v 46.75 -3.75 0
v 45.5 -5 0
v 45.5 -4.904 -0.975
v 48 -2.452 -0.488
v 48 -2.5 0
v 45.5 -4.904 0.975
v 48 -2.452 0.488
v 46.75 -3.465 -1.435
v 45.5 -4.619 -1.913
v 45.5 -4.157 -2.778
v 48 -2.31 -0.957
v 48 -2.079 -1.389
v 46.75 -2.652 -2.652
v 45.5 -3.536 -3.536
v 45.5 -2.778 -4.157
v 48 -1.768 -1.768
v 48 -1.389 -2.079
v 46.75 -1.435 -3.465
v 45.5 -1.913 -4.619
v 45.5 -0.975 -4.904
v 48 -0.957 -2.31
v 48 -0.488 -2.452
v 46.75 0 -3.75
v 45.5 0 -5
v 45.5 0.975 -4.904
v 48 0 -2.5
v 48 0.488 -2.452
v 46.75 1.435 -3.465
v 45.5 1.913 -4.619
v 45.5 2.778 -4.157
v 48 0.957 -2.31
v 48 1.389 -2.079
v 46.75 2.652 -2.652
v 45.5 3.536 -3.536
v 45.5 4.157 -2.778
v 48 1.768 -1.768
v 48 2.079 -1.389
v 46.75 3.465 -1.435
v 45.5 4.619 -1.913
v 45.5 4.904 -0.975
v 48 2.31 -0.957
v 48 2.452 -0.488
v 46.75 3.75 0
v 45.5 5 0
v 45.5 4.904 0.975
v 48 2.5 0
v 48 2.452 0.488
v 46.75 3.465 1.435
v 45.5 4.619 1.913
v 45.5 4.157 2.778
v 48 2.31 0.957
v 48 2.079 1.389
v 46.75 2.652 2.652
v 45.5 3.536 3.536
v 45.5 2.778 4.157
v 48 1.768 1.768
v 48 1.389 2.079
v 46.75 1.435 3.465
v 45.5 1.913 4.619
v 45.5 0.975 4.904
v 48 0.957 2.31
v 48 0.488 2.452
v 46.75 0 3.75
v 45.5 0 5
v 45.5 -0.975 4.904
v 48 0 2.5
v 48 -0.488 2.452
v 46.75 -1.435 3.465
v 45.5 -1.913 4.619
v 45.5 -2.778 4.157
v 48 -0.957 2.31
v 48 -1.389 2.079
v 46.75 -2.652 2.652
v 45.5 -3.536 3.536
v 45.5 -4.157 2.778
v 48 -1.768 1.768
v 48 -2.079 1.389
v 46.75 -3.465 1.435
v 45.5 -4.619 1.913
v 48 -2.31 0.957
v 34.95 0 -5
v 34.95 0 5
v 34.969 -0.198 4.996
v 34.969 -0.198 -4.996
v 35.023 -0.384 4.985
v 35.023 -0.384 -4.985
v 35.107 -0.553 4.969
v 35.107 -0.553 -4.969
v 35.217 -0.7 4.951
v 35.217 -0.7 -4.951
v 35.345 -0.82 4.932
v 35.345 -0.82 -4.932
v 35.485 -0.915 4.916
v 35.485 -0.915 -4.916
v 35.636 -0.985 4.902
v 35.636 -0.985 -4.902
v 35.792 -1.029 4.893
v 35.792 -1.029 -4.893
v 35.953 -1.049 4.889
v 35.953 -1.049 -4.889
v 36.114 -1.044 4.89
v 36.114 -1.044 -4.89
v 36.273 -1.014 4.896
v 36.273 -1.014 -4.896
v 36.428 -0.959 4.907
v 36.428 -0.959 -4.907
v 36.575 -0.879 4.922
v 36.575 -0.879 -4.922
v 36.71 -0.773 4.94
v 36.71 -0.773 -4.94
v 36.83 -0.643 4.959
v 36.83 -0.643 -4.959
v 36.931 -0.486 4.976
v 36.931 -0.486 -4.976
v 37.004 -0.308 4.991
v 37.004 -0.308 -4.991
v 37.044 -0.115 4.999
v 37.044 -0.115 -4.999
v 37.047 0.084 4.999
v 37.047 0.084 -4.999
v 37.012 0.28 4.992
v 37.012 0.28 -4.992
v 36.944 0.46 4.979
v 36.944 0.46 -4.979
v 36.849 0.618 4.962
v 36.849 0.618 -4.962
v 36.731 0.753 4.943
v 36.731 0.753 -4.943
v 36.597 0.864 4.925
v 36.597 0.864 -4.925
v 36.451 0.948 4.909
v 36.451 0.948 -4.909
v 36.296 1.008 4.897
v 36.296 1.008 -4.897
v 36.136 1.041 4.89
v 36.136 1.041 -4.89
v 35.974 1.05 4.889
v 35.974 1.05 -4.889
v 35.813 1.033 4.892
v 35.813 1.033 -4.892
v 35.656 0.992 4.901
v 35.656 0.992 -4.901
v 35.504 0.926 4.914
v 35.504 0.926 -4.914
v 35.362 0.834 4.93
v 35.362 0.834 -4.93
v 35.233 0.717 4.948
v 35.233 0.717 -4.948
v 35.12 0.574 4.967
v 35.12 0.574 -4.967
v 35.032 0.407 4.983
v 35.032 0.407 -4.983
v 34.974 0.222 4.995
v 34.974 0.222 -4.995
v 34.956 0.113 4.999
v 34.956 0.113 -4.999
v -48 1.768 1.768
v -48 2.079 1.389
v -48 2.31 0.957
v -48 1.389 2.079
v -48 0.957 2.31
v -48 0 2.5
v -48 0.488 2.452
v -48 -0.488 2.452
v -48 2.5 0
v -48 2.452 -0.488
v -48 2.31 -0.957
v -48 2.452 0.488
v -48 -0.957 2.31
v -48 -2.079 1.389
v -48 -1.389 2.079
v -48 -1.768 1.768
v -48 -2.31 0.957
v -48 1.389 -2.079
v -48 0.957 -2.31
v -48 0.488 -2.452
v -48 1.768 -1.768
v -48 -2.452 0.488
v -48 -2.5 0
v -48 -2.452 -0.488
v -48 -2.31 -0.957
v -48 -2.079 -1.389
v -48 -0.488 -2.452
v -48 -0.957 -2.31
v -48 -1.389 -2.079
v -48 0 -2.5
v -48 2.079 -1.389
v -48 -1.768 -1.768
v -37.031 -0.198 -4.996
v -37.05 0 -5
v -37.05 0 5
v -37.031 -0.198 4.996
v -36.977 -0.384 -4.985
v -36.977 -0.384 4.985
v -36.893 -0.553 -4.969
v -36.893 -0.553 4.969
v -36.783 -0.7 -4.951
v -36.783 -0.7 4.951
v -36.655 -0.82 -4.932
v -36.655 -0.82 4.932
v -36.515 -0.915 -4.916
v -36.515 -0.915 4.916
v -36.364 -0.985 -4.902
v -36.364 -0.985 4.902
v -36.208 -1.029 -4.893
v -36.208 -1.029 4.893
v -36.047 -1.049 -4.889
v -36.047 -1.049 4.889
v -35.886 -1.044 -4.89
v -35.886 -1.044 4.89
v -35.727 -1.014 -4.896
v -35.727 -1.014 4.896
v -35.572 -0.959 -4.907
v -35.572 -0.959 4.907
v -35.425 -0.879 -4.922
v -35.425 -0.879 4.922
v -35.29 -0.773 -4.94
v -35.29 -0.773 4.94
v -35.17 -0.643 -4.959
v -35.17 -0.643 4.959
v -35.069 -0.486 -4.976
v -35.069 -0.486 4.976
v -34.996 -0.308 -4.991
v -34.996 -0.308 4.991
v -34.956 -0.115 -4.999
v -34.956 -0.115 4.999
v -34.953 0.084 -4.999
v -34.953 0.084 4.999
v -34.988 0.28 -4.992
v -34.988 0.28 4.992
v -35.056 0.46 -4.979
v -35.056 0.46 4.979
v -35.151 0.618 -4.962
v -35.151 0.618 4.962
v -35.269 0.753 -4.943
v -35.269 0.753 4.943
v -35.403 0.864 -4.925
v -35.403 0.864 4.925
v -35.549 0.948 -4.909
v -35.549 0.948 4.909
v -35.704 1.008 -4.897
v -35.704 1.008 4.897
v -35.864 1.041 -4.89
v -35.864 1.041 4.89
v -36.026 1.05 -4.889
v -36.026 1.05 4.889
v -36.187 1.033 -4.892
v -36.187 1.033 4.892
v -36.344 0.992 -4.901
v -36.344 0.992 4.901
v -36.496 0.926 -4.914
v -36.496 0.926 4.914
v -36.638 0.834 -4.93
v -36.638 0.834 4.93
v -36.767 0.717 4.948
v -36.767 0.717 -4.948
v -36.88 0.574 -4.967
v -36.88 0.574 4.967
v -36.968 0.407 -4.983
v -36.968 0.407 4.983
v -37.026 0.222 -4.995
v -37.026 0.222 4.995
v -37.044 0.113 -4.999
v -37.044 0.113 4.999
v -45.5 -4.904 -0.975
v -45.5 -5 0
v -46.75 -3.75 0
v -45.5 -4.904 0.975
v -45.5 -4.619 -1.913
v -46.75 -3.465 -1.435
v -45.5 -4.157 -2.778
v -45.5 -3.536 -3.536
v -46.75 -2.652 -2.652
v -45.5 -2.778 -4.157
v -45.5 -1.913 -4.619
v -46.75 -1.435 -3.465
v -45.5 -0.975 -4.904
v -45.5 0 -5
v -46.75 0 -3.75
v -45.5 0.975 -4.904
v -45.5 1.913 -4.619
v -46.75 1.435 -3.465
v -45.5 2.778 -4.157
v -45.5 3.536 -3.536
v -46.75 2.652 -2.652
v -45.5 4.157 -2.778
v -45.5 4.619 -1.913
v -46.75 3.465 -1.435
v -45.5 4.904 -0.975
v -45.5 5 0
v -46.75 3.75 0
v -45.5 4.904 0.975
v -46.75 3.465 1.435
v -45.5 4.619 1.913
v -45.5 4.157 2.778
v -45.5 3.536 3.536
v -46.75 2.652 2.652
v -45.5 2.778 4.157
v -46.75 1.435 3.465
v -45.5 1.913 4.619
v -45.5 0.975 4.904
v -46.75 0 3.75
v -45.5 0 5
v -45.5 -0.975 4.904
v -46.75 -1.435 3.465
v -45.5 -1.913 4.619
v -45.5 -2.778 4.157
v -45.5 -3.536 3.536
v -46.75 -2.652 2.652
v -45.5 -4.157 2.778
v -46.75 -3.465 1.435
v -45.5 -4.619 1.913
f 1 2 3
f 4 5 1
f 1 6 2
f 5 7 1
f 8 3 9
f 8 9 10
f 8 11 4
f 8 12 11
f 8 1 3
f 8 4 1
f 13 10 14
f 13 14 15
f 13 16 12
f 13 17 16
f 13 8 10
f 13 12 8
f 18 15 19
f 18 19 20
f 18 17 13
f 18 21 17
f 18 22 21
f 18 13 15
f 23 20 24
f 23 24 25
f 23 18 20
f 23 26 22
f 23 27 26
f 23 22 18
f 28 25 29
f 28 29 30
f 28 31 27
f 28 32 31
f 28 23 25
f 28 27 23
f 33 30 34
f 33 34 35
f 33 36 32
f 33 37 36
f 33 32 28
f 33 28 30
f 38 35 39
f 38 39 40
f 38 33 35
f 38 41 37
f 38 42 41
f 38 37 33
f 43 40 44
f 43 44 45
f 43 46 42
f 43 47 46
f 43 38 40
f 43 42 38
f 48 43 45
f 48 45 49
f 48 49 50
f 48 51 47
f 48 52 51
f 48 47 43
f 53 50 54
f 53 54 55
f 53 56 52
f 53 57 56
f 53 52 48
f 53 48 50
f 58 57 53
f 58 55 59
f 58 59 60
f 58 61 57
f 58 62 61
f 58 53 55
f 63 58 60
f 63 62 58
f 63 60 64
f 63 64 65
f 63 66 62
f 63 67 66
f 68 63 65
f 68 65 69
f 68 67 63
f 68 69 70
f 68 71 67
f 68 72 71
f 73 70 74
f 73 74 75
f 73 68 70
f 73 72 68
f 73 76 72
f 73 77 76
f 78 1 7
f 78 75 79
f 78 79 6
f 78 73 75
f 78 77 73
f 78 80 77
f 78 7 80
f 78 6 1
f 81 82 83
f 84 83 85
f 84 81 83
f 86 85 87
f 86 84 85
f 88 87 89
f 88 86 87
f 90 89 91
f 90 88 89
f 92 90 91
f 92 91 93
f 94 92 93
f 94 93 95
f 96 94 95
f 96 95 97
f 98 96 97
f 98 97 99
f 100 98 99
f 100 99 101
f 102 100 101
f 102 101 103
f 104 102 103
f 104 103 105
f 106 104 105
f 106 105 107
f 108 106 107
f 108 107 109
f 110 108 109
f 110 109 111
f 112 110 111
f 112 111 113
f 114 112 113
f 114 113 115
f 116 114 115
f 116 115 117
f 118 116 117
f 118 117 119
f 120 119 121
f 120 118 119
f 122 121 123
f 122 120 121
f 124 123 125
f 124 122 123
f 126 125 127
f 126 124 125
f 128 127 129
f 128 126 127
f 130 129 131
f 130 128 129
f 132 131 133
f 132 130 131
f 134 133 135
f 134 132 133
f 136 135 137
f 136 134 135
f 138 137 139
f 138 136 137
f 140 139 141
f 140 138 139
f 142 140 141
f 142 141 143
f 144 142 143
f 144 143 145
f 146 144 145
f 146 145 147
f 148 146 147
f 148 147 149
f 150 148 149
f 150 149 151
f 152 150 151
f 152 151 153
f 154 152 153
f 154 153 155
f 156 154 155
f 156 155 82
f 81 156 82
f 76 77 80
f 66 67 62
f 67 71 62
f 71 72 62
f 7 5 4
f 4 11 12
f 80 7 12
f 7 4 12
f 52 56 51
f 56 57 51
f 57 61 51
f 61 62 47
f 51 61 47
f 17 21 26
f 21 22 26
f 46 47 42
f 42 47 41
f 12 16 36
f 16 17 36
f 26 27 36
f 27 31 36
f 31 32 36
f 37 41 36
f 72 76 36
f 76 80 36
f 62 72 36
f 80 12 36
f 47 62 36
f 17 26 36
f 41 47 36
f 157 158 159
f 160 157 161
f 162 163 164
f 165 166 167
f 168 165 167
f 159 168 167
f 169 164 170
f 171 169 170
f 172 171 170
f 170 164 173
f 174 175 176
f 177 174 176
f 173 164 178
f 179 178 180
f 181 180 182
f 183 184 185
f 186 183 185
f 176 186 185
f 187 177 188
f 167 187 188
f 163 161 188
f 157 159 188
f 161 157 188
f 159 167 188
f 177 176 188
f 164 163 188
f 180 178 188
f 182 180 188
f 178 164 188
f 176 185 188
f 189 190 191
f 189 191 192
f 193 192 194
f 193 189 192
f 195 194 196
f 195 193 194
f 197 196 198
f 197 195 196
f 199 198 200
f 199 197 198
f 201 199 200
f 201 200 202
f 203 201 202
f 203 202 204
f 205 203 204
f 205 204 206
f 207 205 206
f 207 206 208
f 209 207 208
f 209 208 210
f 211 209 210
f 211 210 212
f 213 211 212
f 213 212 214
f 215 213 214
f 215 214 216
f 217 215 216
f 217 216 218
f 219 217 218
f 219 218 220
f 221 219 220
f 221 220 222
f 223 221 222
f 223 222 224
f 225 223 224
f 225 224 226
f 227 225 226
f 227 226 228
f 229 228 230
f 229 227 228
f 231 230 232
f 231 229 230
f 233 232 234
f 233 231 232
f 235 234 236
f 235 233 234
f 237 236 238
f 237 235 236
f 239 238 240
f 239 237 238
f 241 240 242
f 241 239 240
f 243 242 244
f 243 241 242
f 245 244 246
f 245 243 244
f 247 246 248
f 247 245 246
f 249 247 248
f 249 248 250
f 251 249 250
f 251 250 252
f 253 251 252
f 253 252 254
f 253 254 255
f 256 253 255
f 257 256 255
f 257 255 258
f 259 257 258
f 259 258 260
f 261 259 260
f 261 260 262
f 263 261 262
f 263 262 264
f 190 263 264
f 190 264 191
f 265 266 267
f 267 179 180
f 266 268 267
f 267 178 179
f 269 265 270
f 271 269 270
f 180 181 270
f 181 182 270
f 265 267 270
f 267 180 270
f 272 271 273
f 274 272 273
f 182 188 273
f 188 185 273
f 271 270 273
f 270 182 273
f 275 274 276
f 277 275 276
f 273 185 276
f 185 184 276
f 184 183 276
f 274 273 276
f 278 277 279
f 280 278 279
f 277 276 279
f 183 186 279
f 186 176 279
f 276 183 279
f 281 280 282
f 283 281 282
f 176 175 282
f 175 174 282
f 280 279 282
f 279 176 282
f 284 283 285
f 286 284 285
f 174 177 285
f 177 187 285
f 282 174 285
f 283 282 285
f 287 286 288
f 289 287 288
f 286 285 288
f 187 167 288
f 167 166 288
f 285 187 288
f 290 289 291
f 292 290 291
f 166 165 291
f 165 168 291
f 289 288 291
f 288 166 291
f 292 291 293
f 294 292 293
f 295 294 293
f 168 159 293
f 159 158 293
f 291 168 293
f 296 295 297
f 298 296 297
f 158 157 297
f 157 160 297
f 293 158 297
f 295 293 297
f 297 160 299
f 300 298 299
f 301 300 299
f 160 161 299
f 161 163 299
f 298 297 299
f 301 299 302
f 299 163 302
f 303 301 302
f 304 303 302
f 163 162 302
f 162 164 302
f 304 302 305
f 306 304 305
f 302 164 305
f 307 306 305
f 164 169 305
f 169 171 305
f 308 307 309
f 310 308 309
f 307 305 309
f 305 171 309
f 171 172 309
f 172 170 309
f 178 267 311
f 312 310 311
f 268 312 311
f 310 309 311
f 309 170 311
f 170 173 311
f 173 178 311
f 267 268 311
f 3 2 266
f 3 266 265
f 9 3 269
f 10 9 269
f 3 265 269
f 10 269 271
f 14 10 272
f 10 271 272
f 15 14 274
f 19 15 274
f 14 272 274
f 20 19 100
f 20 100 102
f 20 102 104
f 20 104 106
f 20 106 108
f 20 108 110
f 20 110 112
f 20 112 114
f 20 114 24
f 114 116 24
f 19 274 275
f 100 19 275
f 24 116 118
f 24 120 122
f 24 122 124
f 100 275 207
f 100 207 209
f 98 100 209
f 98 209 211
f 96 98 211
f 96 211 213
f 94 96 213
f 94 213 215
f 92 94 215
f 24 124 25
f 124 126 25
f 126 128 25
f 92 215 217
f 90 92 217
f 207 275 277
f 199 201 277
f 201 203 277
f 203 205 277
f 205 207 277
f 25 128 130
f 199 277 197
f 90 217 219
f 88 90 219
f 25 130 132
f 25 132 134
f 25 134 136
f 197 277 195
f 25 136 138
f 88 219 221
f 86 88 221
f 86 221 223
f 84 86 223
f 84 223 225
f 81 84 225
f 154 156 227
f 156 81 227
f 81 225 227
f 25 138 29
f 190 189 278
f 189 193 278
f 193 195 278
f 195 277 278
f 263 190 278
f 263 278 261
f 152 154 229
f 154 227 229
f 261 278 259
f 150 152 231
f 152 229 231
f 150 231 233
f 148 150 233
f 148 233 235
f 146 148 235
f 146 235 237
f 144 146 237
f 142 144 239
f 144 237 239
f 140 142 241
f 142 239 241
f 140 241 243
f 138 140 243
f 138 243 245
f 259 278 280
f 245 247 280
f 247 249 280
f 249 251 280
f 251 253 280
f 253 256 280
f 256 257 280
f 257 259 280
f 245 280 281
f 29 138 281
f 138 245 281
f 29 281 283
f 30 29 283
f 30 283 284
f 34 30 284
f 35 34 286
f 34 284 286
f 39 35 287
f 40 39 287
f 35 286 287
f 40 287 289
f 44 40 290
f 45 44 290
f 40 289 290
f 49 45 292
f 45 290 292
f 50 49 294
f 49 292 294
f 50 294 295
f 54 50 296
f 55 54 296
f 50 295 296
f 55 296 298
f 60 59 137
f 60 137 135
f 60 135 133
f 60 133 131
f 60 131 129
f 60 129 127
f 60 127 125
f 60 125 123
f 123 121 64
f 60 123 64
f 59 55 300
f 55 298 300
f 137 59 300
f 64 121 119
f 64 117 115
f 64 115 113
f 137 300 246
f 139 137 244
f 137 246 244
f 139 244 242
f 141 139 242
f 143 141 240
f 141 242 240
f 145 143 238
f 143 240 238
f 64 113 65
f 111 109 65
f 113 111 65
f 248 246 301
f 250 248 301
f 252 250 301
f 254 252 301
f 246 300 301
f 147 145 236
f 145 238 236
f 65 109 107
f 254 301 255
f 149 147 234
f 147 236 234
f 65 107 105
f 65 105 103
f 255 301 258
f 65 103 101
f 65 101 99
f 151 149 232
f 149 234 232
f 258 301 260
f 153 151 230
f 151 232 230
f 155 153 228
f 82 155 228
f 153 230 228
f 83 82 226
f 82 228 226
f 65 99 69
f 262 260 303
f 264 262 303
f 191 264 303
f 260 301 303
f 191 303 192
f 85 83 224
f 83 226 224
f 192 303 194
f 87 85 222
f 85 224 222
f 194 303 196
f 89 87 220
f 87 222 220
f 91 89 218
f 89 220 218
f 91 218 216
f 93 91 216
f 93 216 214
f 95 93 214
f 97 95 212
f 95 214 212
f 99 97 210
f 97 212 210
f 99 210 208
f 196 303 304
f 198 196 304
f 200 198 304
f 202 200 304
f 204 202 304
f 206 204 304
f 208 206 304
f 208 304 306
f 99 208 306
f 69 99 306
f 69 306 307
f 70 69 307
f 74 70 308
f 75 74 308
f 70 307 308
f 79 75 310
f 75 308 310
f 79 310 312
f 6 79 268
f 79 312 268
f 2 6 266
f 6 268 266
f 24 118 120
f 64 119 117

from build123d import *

# Parameters (mm, degrees)
SKETCH1_W               = 96
SKETCH1_H               = 5
CUT_EXTRUDE1_DEPTH      = 41
CUT_EXTRUDE1_DEPTH_BACK = 20
SKETCH1_5_R             = 1.05
CUT_EXTRUDE2_DEPTH      = 20
CUT_EXTRUDE2_DEPTH_BACK = 20
SKETCH1_6_R             = 1.05
CHAMFER1_SIZE           = 2.5
CHAMFER2_SIZE           = 2.5


with BuildPart() as part:
    # Sketch1 → Revolve1 (revolve)
    with BuildSketch(Plane.XY):
        with Locations((0, 2.5)):
            Rectangle(SKETCH1_W, SKETCH1_H)
    revolve(axis=Axis((-48, 0, 0), (1, 0, 0)))

    # Sketch1<5> → Cut-Extrude1 (cut, two sides: drawn at the far end of the back side and taken through both)
    with BuildSketch(Plane.XY.offset(-CUT_EXTRUDE1_DEPTH_BACK)):
        with Locations((-36, 0)):
            Circle(SKETCH1_5_R)
    extrude(amount=CUT_EXTRUDE1_DEPTH + CUT_EXTRUDE1_DEPTH_BACK, mode=Mode.SUBTRACT)

    # Sketch1<6> → Cut-Extrude2 (cut, two sides: drawn at the far end of the back side and taken through both)
    with BuildSketch(Plane.XY.offset(-CUT_EXTRUDE2_DEPTH_BACK)):
        with Locations((36, 0)):
            Circle(SKETCH1_6_R)
    extrude(amount=CUT_EXTRUDE2_DEPTH + CUT_EXTRUDE2_DEPTH_BACK, mode=Mode.SUBTRACT)

    # Chamfer1
    chamfer1_edges = [part.edges().sort_by_distance(p)[0] for p in [
        (-48, -5, 0),
    ]]
    chamfer(chamfer1_edges, length=CHAMFER1_SIZE)

    # Chamfer2
    chamfer2_edges = [part.edges().sort_by_distance(p)[0] for p in [
        (48, -5, 0),
    ]]
    chamfer(chamfer2_edges, length=CHAMFER2_SIZE)


solid = part.part
